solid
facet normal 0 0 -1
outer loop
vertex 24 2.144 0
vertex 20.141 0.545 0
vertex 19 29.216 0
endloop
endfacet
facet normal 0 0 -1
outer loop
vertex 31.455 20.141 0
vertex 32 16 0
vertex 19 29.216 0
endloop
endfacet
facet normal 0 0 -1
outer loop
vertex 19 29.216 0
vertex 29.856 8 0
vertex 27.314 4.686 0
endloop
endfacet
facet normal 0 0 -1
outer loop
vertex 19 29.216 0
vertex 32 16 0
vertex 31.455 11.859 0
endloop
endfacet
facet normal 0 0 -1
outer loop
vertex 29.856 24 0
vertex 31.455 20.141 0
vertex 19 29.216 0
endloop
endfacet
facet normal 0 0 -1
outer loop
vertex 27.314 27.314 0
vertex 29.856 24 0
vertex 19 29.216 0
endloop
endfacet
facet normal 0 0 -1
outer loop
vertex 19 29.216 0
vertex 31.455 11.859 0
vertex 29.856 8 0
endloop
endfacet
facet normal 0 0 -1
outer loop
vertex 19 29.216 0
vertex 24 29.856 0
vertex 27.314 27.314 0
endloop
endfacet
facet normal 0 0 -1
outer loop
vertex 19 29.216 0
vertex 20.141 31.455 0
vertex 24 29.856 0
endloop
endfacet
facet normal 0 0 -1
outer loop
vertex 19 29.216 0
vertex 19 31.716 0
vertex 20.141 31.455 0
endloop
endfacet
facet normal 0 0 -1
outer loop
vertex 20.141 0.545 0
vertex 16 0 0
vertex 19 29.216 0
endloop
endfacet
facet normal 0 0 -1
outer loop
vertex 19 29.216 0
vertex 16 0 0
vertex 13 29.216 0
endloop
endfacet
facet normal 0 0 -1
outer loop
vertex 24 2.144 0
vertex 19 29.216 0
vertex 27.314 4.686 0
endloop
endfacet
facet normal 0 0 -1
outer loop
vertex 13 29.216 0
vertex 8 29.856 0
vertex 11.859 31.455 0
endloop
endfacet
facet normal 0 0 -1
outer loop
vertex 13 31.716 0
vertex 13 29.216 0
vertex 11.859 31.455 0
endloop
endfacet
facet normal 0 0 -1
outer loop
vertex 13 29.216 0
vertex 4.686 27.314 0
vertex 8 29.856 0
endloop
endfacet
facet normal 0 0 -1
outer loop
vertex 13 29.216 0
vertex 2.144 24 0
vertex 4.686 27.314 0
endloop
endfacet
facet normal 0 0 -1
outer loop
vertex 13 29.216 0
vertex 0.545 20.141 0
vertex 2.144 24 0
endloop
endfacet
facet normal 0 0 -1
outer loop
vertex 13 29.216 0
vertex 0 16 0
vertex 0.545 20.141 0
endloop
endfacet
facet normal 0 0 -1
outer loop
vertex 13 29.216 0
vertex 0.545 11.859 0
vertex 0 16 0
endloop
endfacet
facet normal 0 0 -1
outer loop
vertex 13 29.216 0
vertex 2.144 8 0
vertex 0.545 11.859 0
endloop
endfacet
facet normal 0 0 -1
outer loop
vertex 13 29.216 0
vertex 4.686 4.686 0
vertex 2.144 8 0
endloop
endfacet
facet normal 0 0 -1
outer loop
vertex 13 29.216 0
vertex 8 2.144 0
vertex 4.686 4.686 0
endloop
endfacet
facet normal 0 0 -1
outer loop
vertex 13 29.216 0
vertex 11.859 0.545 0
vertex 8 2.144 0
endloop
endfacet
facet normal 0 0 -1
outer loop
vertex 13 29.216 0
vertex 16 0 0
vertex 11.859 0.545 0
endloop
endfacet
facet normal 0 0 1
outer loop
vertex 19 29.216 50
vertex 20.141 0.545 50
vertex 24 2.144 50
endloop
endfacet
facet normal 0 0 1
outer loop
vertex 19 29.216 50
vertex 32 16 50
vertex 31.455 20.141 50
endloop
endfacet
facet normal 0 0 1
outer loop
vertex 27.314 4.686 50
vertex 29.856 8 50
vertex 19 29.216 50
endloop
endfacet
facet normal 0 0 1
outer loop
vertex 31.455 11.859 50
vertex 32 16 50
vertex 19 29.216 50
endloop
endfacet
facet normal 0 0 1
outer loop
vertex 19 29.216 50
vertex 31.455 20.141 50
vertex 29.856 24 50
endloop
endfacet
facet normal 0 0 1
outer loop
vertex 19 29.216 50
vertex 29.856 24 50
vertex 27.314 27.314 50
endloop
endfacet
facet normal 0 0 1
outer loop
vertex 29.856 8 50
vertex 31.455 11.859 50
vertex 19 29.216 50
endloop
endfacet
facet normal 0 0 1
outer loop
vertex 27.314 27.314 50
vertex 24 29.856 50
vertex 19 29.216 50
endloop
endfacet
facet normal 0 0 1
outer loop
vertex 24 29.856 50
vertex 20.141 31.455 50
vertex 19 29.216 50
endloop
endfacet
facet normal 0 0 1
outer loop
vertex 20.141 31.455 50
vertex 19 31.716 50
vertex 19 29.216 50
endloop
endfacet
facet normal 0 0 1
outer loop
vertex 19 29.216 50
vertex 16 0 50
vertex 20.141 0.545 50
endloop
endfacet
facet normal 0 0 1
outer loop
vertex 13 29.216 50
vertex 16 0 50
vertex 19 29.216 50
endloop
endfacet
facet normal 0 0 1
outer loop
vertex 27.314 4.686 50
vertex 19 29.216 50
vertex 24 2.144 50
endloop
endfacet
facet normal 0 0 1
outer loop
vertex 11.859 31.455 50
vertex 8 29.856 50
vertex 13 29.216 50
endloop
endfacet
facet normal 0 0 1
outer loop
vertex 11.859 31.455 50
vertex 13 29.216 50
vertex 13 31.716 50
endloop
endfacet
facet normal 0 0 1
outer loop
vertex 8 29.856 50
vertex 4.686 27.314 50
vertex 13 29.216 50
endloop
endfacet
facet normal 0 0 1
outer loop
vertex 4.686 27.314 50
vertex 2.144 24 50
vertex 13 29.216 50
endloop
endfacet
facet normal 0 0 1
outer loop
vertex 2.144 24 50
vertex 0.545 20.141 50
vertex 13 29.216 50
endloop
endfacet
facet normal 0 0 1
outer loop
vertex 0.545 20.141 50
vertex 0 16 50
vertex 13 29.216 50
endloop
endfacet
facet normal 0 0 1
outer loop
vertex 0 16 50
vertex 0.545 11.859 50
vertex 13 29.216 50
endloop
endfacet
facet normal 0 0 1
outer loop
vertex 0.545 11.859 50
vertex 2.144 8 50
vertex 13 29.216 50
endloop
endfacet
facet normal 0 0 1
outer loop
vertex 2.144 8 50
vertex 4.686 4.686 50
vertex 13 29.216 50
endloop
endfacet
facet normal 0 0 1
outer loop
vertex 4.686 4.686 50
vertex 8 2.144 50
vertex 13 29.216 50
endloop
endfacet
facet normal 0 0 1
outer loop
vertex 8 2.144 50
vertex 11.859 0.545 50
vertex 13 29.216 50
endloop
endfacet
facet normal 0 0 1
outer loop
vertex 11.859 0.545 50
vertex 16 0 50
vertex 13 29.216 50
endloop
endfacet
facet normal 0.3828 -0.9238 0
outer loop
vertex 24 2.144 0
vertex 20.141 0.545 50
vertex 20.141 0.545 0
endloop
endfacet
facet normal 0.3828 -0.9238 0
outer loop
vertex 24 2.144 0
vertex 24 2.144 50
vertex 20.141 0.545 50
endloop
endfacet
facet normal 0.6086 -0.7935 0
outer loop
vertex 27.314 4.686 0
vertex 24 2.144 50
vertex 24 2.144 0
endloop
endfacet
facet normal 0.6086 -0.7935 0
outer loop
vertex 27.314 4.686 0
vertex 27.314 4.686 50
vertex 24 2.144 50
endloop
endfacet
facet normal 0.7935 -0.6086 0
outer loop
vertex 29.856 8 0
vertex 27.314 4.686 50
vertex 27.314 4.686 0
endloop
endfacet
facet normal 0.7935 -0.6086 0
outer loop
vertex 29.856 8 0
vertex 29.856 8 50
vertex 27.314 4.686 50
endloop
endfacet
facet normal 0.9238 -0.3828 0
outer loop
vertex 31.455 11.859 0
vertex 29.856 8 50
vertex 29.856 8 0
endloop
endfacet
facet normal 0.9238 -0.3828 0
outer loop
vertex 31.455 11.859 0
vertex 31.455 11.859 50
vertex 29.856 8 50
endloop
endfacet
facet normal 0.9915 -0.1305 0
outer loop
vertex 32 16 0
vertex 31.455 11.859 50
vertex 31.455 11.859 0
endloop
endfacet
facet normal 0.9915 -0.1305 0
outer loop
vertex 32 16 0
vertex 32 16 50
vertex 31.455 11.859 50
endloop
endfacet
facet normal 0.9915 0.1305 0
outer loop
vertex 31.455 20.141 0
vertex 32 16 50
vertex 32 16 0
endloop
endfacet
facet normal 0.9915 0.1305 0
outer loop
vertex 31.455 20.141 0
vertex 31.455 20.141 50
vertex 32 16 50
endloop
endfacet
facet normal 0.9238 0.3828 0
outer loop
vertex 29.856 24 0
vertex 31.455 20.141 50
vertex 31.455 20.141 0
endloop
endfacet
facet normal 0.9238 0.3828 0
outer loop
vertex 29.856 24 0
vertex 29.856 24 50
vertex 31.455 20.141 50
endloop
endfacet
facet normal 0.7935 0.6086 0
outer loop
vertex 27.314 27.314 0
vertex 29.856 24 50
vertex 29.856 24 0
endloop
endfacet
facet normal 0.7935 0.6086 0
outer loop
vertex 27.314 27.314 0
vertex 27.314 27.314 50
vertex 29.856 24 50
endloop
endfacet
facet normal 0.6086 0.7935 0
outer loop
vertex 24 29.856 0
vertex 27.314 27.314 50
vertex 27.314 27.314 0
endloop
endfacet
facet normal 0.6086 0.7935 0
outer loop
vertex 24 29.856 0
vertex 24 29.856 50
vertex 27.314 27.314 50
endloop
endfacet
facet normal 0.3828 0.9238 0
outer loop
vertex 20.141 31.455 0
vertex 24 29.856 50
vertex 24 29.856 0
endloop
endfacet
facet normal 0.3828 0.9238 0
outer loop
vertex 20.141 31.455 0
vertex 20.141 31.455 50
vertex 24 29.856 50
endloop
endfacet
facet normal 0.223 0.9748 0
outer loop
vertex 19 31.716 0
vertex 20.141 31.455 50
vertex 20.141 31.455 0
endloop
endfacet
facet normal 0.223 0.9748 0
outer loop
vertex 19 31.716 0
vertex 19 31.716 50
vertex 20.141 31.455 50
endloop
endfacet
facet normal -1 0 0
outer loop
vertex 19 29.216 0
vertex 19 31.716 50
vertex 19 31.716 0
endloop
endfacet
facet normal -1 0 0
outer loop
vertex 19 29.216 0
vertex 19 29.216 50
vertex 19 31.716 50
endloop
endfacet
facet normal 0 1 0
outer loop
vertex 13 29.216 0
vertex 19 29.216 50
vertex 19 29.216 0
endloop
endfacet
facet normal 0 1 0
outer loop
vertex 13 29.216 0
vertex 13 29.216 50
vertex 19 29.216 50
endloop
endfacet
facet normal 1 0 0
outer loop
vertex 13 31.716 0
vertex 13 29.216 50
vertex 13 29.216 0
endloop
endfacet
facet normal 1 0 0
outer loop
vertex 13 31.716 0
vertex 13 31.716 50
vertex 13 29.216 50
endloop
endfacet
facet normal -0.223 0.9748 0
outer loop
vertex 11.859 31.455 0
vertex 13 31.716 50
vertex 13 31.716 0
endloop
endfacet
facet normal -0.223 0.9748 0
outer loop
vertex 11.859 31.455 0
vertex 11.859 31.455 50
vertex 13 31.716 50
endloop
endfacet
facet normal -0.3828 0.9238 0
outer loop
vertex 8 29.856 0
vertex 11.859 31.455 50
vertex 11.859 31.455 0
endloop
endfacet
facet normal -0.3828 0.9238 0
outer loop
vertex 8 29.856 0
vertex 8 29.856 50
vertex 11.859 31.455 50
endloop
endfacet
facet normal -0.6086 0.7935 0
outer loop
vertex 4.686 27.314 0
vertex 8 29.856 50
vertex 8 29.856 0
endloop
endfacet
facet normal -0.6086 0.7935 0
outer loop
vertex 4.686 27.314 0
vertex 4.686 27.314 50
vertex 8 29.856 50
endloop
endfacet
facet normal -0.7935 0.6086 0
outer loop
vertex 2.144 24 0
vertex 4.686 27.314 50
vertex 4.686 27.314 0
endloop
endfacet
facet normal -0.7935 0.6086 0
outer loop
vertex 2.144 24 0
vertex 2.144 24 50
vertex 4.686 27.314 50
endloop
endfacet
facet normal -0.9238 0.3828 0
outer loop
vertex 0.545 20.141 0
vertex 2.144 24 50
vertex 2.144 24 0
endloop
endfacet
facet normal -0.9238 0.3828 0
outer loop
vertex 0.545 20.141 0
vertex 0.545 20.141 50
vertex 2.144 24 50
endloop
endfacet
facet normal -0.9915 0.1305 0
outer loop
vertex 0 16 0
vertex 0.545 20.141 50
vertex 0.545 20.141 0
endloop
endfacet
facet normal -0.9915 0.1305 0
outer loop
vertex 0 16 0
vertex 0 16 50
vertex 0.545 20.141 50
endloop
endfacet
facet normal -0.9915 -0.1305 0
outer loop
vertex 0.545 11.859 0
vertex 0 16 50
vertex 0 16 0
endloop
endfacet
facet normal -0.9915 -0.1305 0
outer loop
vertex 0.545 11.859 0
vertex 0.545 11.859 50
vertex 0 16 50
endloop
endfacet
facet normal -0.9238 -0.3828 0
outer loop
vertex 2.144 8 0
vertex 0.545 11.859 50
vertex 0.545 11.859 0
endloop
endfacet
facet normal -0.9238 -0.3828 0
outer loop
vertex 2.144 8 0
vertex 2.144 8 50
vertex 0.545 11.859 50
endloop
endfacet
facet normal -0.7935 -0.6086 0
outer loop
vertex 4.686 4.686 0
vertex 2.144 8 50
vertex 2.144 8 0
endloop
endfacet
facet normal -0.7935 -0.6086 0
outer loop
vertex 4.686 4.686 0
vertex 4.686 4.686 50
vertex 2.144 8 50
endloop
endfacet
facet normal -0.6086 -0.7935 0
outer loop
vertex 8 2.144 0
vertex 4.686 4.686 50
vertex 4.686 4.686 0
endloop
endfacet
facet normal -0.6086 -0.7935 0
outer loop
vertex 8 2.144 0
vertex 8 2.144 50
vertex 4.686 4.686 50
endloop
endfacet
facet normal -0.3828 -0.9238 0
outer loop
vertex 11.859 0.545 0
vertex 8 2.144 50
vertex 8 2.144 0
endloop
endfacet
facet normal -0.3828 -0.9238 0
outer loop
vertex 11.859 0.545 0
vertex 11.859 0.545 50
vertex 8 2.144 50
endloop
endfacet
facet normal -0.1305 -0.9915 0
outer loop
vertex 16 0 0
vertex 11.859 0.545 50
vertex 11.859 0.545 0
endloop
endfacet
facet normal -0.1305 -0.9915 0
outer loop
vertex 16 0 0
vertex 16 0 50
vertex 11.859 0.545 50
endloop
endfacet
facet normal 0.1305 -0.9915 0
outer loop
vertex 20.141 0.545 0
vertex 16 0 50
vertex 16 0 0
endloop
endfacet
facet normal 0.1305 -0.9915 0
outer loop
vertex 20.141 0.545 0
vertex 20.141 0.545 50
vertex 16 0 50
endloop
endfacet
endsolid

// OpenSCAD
$fn = 32;

// ----------------------------------------------------------------------
// Keyway shaft: d32 shaft, key 6 x 2.5 mm
// ----------------------------------------------------------------------

// --- parameters (mm) ---
shaft_r = 16;             // shaft radius
key_w = 6;                // keyway width
key_d = 2.5;              // keyway depth below the surface line
plate_t = 50;             // shaft length, Z (extrusion height)

shaft_d = 2 * shaft_r;  // shaft diameter
circle_step = 15;  // polygon sampling step, degrees

profile = [[11.859, 31.455], [8, 29.856], [4.686, 27.314], [2.144, 24], [0.545, 20.141], [0, 16], [0.545, 11.859], [2.144, 8], [4.686, 4.686], [8, 2.144], [11.859, 0.545], [16, 0], [20.141, 0.545], [24, 2.144], [27.314, 4.686], [29.856, 8], [31.455, 11.859], [32, 16], [31.455, 20.141], [29.856, 24], [27.314, 27.314], [24, 29.856], [20.141, 31.455], [19, 31.716], [19, 29.216], [13, 29.216], [13, 31.716]];  // primary outline, 27 points, counter clockwise

// --- the one profile operation ---
linear_extrude(height = plate_t) polygon(points = profile);
